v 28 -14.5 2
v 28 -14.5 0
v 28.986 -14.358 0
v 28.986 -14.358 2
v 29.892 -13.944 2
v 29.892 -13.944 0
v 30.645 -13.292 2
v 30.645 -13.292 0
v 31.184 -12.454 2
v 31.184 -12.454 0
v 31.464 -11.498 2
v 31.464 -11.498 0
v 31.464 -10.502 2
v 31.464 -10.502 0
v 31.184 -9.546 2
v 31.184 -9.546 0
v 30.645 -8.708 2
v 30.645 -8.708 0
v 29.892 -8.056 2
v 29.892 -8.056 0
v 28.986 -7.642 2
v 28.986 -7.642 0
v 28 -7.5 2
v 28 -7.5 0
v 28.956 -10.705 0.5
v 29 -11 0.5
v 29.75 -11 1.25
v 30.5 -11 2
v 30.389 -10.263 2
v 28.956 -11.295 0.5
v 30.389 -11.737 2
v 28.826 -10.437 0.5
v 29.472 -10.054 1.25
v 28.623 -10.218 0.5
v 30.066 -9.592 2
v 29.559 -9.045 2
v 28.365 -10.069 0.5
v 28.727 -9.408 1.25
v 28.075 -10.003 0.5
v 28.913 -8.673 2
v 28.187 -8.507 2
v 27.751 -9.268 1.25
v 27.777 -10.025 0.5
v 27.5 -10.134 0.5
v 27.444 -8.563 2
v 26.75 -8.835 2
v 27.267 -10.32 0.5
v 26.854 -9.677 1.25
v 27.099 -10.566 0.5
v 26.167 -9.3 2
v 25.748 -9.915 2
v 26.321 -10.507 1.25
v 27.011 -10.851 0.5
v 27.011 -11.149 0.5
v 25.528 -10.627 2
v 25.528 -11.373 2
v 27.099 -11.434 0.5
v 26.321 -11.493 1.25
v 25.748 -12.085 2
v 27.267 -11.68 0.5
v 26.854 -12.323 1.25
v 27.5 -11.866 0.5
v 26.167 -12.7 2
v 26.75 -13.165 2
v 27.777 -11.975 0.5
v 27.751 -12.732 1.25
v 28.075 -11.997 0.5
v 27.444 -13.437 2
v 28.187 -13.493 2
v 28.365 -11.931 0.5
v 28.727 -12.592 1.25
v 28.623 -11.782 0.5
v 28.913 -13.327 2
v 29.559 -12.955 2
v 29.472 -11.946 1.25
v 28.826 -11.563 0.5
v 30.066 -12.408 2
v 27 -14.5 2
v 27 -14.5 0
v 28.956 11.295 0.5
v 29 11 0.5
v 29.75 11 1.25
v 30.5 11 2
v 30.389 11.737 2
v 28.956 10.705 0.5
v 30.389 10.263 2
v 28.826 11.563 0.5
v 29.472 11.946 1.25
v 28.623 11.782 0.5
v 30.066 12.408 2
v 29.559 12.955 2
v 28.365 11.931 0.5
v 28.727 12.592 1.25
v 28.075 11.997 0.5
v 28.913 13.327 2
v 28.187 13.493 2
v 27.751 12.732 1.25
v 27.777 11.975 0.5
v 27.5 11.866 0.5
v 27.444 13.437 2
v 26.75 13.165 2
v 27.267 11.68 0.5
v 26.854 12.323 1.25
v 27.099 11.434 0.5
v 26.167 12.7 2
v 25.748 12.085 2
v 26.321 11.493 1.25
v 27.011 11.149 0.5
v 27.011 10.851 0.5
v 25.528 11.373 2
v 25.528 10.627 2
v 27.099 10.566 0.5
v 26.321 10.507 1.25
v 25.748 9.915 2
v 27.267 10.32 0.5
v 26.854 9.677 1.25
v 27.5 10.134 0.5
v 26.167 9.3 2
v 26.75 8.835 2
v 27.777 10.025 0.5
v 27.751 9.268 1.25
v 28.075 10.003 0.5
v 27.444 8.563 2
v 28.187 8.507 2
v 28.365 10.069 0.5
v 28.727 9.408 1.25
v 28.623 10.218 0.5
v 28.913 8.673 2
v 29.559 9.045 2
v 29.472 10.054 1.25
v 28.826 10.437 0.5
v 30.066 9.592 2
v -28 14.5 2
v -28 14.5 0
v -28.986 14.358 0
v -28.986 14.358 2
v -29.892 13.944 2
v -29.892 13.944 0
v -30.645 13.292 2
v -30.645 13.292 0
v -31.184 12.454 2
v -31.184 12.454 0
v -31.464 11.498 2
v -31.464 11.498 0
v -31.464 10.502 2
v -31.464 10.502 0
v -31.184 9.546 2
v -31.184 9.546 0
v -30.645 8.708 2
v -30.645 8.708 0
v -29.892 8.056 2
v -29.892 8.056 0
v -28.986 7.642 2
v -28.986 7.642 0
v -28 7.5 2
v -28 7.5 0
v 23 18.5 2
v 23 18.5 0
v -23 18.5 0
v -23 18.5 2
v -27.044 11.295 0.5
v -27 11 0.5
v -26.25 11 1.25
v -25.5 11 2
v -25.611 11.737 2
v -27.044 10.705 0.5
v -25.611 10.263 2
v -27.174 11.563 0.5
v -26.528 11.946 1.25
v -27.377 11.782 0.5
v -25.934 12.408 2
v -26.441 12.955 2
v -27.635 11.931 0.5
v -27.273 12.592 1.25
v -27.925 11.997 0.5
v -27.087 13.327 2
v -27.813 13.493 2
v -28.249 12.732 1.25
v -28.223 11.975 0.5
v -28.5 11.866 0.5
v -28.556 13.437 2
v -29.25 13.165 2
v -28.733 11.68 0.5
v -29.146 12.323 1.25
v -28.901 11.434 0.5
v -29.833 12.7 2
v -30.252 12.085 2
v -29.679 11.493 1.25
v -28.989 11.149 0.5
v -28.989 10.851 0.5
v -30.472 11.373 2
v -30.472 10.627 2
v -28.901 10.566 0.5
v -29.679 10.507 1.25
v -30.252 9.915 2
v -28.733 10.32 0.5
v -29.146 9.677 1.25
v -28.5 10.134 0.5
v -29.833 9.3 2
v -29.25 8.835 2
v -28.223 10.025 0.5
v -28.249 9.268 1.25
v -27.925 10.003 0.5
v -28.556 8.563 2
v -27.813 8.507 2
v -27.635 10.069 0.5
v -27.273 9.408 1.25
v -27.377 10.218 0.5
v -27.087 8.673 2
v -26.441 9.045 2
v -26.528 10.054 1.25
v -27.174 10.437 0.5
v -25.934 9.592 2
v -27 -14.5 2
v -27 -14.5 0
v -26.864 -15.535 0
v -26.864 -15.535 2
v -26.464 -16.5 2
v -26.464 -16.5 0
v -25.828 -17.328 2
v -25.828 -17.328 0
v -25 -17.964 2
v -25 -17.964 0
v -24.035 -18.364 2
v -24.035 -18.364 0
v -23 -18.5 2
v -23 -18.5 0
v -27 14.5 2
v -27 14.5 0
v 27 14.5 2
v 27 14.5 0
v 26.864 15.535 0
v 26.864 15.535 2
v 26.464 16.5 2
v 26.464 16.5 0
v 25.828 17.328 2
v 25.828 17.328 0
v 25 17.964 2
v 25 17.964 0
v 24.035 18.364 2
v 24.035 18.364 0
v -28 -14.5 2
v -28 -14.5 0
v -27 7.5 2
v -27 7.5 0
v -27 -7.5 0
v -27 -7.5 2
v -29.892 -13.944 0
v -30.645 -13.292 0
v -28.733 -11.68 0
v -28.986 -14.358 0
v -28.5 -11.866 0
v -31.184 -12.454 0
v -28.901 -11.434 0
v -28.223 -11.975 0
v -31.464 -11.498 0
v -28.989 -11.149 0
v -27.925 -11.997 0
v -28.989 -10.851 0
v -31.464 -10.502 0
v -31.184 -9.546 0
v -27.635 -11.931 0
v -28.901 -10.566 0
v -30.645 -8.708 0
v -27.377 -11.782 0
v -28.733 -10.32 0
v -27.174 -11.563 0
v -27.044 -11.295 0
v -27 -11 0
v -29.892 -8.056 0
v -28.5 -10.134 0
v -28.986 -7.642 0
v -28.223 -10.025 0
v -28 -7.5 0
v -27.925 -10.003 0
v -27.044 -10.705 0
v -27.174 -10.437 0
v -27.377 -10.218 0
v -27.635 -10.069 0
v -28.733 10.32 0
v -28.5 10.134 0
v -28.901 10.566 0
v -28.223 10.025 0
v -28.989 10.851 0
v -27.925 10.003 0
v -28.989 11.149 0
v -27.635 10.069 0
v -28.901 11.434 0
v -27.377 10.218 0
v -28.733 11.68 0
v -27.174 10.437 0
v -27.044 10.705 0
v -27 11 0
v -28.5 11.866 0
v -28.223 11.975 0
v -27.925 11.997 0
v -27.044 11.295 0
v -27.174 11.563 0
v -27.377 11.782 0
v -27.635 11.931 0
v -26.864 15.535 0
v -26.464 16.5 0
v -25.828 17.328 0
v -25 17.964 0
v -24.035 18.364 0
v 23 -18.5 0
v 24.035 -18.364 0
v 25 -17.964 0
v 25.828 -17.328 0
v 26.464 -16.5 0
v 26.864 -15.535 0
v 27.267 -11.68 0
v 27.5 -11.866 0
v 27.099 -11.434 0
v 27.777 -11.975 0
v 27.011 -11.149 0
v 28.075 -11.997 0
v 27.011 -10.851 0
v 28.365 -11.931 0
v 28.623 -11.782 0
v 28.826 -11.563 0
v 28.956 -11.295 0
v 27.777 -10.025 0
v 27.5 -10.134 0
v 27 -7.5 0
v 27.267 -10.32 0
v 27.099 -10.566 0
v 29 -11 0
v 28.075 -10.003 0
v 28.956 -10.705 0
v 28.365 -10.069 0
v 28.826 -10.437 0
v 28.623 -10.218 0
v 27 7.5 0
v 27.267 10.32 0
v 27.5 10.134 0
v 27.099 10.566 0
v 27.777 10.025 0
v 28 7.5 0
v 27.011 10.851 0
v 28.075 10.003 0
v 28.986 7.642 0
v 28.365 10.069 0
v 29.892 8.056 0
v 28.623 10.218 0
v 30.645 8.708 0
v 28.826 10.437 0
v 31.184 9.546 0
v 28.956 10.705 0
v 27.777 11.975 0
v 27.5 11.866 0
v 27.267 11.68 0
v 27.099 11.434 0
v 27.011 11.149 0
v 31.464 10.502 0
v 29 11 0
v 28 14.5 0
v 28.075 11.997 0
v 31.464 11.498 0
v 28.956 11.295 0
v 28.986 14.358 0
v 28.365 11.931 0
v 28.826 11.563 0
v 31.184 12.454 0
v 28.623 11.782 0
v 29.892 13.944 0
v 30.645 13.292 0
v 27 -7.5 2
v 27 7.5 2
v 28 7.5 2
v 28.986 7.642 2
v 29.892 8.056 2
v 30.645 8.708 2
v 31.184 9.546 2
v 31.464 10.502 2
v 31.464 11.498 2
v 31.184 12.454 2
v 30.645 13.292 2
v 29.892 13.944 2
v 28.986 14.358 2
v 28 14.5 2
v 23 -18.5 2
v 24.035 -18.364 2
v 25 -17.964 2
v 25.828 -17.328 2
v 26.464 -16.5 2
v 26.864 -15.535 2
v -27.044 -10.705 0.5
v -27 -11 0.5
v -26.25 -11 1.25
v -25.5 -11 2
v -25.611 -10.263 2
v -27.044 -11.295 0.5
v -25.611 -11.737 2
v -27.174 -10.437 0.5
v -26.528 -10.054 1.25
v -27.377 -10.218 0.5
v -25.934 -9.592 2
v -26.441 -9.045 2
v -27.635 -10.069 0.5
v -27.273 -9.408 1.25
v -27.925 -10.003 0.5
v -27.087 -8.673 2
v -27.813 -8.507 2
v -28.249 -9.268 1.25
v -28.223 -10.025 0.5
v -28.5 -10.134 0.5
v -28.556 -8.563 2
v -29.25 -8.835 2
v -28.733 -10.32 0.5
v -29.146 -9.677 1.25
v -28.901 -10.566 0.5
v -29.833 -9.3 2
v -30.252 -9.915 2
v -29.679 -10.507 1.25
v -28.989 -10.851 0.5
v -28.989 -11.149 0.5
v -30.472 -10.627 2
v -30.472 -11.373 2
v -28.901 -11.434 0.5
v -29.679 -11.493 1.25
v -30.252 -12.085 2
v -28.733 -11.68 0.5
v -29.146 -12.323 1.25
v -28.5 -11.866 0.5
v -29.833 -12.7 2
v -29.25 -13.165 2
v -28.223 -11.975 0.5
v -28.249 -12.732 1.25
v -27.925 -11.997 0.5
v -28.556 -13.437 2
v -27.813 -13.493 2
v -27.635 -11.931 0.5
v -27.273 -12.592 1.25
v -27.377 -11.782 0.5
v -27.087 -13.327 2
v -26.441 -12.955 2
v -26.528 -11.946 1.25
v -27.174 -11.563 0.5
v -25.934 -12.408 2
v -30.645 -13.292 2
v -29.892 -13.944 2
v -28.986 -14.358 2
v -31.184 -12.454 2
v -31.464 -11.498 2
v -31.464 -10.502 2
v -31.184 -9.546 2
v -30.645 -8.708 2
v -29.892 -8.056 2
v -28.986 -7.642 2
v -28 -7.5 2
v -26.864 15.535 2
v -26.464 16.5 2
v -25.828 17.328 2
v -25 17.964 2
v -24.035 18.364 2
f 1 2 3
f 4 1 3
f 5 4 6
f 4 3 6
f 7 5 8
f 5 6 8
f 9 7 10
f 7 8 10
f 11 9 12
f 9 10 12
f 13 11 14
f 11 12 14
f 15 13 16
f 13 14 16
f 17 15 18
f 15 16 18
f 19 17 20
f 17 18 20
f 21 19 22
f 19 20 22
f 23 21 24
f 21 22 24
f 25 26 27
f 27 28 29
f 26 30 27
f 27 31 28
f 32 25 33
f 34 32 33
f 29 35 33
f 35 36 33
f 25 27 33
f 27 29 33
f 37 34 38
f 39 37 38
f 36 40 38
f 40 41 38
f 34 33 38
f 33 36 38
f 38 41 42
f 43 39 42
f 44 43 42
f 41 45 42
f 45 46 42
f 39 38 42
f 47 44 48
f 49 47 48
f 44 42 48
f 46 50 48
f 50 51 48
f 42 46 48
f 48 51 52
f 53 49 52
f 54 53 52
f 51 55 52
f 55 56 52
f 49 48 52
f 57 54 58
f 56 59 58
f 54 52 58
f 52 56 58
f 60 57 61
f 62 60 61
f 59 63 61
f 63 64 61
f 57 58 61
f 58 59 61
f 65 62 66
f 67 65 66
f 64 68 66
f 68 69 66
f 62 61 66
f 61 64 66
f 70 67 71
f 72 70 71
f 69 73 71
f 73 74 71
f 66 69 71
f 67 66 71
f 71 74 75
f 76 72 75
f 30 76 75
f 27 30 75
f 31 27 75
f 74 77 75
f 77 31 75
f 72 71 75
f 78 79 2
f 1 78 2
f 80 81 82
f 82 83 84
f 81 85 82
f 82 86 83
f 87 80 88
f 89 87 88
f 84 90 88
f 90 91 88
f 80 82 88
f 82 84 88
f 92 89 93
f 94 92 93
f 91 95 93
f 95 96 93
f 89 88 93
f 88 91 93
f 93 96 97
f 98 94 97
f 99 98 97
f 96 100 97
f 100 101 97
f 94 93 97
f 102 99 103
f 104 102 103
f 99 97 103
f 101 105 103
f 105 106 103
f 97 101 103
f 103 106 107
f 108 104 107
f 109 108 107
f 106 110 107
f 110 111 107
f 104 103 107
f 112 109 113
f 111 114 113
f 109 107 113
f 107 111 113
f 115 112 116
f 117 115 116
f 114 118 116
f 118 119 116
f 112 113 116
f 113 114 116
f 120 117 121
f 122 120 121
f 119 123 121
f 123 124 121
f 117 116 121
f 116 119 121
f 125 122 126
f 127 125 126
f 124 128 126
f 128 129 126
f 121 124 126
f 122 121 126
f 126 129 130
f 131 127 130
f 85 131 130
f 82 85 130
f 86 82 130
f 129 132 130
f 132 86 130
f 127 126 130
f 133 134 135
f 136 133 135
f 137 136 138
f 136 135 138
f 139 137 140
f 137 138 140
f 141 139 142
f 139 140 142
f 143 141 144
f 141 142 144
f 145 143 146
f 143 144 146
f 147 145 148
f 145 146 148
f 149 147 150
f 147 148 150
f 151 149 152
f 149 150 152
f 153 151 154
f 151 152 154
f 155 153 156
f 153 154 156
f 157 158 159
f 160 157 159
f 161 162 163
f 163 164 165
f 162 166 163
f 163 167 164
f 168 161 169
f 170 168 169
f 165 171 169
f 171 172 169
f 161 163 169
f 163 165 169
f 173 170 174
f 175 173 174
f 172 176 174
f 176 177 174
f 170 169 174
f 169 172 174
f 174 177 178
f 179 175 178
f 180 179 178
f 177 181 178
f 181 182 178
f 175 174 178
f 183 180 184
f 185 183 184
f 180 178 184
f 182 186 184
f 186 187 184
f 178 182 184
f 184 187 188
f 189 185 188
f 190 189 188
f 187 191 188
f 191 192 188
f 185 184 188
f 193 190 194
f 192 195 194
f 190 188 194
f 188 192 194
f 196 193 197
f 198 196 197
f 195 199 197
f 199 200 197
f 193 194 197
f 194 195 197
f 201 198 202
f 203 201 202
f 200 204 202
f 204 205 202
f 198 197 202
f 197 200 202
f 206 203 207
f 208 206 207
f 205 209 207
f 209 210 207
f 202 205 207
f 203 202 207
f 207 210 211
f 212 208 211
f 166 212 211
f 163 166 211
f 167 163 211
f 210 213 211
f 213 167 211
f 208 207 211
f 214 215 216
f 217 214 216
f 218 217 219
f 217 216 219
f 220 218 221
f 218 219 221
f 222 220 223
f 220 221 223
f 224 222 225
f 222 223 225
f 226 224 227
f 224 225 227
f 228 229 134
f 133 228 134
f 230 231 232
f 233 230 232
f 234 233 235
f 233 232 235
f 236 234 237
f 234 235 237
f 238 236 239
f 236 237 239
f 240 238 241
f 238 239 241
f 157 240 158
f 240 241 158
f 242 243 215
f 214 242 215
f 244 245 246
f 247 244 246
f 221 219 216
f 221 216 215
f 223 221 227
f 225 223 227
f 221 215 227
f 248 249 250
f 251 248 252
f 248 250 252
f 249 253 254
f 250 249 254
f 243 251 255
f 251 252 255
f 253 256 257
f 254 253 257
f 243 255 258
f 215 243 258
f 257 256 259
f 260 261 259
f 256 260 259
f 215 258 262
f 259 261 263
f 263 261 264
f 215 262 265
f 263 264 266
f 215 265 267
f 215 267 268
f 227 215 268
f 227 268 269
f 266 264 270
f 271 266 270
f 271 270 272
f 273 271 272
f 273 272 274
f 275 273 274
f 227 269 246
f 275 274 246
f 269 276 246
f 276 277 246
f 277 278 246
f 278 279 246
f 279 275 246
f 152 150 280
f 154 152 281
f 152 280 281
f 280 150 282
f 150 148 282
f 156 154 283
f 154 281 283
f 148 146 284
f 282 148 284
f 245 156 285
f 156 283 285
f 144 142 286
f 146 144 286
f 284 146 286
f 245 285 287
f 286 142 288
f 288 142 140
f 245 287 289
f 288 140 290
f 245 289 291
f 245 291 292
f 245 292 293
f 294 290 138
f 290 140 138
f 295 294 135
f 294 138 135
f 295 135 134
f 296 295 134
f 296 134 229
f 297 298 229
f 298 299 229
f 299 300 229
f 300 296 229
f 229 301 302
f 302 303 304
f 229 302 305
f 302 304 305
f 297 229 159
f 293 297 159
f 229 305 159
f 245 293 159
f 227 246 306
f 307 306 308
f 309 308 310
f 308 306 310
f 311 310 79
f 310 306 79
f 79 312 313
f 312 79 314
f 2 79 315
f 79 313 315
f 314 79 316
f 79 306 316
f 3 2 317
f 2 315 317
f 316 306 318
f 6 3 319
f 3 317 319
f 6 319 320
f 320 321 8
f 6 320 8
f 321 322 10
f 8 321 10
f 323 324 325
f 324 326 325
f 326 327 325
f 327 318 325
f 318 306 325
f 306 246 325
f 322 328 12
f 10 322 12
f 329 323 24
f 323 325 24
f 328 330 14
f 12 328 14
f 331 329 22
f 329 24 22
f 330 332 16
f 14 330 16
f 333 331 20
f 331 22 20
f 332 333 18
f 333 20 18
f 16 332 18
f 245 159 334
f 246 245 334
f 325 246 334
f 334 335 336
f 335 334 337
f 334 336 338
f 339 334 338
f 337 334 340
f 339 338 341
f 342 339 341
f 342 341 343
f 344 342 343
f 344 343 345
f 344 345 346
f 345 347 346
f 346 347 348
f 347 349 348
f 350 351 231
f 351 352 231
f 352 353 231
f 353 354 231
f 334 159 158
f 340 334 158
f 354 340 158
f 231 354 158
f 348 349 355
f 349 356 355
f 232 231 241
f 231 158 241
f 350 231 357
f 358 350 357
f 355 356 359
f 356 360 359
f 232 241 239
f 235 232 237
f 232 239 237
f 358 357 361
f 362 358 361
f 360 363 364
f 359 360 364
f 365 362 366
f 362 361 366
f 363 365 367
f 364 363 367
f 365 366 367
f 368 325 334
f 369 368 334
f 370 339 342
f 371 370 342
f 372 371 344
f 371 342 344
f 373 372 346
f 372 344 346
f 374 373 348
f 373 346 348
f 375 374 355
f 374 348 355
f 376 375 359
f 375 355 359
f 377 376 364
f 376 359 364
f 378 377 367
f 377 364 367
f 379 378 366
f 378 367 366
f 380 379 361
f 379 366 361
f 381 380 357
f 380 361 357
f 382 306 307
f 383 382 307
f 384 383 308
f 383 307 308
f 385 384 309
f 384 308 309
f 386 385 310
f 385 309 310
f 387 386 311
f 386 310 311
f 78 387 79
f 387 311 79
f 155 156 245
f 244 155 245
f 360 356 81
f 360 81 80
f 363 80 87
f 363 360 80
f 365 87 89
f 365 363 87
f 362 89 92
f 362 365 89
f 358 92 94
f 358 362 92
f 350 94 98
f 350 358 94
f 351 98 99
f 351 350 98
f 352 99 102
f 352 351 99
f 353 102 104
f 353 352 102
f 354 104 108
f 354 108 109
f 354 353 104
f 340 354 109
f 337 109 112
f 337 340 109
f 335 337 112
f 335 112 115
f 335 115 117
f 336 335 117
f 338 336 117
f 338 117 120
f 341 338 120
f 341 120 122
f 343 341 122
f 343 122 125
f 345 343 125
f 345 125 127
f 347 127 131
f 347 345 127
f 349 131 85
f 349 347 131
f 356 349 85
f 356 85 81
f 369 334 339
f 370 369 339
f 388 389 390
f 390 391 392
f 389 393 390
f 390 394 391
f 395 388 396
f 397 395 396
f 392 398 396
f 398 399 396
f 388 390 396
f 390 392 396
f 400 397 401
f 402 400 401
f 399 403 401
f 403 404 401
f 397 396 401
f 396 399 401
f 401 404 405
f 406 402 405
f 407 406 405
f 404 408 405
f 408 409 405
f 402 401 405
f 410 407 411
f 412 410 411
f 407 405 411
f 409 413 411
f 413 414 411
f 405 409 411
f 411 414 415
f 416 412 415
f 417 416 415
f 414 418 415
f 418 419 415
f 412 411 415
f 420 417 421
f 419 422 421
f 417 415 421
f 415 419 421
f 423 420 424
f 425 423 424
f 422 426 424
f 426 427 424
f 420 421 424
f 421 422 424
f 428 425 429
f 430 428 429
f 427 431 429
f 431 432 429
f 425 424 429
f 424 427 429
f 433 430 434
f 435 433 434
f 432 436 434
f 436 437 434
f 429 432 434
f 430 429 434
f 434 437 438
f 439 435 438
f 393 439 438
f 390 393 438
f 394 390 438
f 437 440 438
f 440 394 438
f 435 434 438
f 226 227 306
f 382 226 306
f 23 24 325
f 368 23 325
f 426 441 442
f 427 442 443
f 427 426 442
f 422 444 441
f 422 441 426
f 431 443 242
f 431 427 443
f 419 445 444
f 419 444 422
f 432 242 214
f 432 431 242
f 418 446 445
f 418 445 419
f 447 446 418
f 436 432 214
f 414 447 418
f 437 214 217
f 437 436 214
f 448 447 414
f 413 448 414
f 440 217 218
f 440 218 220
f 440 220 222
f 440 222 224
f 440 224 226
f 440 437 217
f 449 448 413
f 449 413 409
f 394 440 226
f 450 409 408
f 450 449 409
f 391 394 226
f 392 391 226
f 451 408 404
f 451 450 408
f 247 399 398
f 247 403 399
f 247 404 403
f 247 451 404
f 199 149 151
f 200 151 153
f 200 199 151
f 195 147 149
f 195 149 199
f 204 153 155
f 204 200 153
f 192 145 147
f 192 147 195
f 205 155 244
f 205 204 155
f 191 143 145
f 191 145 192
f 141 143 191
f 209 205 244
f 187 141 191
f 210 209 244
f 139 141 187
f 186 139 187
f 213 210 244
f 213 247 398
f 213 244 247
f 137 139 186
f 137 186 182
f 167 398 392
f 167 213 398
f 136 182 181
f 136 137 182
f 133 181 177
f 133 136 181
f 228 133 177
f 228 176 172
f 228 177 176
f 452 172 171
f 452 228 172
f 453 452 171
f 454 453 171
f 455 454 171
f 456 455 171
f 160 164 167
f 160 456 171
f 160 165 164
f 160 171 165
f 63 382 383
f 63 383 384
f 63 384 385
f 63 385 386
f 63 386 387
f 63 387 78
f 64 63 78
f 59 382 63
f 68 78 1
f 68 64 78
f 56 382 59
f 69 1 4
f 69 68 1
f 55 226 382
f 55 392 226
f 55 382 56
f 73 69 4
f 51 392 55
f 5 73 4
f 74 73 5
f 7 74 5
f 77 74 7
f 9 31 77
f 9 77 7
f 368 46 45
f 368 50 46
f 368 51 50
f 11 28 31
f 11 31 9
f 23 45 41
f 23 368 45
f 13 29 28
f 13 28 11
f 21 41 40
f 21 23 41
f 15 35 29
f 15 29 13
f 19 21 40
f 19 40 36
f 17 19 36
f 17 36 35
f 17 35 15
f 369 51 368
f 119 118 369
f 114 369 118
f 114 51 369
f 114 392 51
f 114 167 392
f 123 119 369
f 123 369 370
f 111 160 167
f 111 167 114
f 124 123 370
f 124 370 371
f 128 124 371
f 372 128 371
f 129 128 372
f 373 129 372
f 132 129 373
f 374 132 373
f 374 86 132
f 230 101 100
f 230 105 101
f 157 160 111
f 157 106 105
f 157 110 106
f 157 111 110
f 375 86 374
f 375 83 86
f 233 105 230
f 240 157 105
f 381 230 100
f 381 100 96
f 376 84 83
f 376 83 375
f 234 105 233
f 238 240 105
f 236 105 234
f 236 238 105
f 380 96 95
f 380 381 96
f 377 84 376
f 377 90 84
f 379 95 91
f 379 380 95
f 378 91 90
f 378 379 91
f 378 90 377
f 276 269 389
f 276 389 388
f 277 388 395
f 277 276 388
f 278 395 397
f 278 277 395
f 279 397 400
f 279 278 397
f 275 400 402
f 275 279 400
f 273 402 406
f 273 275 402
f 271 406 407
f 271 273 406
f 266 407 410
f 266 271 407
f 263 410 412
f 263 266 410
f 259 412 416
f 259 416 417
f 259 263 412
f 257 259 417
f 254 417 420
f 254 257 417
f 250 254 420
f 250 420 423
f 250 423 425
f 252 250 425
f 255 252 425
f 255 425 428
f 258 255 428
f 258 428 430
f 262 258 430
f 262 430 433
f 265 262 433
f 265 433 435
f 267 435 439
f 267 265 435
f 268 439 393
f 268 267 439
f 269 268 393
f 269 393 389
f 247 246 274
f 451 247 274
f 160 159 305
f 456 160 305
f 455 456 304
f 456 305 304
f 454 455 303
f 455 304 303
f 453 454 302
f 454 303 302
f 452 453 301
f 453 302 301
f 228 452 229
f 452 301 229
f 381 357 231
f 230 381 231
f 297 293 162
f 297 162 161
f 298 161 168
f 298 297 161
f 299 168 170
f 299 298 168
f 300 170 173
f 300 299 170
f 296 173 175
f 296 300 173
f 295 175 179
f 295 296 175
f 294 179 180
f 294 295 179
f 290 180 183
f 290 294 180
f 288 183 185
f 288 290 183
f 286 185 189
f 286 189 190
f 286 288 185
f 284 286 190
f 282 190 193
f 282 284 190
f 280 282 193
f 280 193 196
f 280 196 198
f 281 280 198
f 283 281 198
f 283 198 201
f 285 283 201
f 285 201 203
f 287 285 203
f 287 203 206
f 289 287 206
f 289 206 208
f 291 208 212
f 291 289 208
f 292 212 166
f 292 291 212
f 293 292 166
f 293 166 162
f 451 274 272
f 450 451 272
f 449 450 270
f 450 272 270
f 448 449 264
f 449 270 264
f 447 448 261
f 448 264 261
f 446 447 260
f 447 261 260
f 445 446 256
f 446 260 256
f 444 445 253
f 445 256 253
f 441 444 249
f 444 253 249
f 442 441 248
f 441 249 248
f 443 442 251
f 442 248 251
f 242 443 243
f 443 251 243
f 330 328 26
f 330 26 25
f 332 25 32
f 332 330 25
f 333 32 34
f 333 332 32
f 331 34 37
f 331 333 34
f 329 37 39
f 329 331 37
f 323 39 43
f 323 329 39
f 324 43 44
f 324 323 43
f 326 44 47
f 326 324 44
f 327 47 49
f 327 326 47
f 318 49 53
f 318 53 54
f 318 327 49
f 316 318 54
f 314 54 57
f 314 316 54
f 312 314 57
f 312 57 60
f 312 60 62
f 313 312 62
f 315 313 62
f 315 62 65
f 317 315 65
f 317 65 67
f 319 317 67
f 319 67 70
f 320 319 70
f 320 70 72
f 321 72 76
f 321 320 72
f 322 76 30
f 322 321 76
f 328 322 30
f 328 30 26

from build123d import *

# Parameters (mm, degrees)
SCHIZZO1_R                   = 1
ESTRUSIONE_ESTRUSIONE1_DEPTH = 2
SMUSSO1_SIZE                 = 1.5


with BuildPart() as part:
    # Schizzo1 → Estrusione-Estrusione1 (new body)
    with BuildSketch(Plane.XY):
        with BuildLine():
            Line((-23, -18.5), (23, -18.5))
            ThreePointArc((23, -18.5), (25.828427125, -17.328427125), (27, -14.5))
            Line((27, -14.5), (28, -14.5))
            ThreePointArc((28, -14.5), (31.5, -11), (28, -7.5))
            Line((28, -7.5), (27, -7.5))
            Line((27, -7.5), (27, 7.5))
            Line((27, 7.5), (28, 7.5))
            ThreePointArc((28, 7.5), (31.5, 11), (28, 14.5))
            Line((28, 14.5), (27, 14.5))
            ThreePointArc((27, 14.5), (25.828427125, 17.328427125), (23, 18.5))
            Line((23, 18.5), (-23, 18.5))
            ThreePointArc((-23, 18.5), (-25.828427125, 17.328427125), (-27, 14.5))
            Line((-27, 14.5), (-28, 14.5))
            ThreePointArc((-28, 14.5), (-31.5, 11), (-28, 7.5))
            Line((-28, 7.5), (-27, 7.5))
            Line((-27, 7.5), (-27, -7.5))
            Line((-27, -7.5), (-28, -7.5))
            ThreePointArc((-28, -7.5), (-31.5, -11), (-28, -14.5))
            Line((-28, -14.5), (-27, -14.5))
            ThreePointArc((-27, -14.5), (-25.828427125, -17.328427125), (-23, -18.5))
        make_face()
        with Locations((-28, 11)):
            Circle(SCHIZZO1_R, mode=Mode.SUBTRACT)
        with Locations((-28, -11)):
            Circle(SCHIZZO1_R, mode=Mode.SUBTRACT)
        with Locations((28, -11)):
            Circle(SCHIZZO1_R, mode=Mode.SUBTRACT)
        with Locations((28, 11)):
            Circle(SCHIZZO1_R, mode=Mode.SUBTRACT)
    extrude(amount=ESTRUSIONE_ESTRUSIONE1_DEPTH)

    # Smusso1
    smusso1_edges = [part.edges().sort_by_distance(p)[0] for p in [
        (-29, 11, 2),
        (-29, -11, 2),
        (27, -11, 2),
        (27, 11, 2),
    ]]
    chamfer(smusso1_edges, length=SMUSSO1_SIZE)


solid = part.part
